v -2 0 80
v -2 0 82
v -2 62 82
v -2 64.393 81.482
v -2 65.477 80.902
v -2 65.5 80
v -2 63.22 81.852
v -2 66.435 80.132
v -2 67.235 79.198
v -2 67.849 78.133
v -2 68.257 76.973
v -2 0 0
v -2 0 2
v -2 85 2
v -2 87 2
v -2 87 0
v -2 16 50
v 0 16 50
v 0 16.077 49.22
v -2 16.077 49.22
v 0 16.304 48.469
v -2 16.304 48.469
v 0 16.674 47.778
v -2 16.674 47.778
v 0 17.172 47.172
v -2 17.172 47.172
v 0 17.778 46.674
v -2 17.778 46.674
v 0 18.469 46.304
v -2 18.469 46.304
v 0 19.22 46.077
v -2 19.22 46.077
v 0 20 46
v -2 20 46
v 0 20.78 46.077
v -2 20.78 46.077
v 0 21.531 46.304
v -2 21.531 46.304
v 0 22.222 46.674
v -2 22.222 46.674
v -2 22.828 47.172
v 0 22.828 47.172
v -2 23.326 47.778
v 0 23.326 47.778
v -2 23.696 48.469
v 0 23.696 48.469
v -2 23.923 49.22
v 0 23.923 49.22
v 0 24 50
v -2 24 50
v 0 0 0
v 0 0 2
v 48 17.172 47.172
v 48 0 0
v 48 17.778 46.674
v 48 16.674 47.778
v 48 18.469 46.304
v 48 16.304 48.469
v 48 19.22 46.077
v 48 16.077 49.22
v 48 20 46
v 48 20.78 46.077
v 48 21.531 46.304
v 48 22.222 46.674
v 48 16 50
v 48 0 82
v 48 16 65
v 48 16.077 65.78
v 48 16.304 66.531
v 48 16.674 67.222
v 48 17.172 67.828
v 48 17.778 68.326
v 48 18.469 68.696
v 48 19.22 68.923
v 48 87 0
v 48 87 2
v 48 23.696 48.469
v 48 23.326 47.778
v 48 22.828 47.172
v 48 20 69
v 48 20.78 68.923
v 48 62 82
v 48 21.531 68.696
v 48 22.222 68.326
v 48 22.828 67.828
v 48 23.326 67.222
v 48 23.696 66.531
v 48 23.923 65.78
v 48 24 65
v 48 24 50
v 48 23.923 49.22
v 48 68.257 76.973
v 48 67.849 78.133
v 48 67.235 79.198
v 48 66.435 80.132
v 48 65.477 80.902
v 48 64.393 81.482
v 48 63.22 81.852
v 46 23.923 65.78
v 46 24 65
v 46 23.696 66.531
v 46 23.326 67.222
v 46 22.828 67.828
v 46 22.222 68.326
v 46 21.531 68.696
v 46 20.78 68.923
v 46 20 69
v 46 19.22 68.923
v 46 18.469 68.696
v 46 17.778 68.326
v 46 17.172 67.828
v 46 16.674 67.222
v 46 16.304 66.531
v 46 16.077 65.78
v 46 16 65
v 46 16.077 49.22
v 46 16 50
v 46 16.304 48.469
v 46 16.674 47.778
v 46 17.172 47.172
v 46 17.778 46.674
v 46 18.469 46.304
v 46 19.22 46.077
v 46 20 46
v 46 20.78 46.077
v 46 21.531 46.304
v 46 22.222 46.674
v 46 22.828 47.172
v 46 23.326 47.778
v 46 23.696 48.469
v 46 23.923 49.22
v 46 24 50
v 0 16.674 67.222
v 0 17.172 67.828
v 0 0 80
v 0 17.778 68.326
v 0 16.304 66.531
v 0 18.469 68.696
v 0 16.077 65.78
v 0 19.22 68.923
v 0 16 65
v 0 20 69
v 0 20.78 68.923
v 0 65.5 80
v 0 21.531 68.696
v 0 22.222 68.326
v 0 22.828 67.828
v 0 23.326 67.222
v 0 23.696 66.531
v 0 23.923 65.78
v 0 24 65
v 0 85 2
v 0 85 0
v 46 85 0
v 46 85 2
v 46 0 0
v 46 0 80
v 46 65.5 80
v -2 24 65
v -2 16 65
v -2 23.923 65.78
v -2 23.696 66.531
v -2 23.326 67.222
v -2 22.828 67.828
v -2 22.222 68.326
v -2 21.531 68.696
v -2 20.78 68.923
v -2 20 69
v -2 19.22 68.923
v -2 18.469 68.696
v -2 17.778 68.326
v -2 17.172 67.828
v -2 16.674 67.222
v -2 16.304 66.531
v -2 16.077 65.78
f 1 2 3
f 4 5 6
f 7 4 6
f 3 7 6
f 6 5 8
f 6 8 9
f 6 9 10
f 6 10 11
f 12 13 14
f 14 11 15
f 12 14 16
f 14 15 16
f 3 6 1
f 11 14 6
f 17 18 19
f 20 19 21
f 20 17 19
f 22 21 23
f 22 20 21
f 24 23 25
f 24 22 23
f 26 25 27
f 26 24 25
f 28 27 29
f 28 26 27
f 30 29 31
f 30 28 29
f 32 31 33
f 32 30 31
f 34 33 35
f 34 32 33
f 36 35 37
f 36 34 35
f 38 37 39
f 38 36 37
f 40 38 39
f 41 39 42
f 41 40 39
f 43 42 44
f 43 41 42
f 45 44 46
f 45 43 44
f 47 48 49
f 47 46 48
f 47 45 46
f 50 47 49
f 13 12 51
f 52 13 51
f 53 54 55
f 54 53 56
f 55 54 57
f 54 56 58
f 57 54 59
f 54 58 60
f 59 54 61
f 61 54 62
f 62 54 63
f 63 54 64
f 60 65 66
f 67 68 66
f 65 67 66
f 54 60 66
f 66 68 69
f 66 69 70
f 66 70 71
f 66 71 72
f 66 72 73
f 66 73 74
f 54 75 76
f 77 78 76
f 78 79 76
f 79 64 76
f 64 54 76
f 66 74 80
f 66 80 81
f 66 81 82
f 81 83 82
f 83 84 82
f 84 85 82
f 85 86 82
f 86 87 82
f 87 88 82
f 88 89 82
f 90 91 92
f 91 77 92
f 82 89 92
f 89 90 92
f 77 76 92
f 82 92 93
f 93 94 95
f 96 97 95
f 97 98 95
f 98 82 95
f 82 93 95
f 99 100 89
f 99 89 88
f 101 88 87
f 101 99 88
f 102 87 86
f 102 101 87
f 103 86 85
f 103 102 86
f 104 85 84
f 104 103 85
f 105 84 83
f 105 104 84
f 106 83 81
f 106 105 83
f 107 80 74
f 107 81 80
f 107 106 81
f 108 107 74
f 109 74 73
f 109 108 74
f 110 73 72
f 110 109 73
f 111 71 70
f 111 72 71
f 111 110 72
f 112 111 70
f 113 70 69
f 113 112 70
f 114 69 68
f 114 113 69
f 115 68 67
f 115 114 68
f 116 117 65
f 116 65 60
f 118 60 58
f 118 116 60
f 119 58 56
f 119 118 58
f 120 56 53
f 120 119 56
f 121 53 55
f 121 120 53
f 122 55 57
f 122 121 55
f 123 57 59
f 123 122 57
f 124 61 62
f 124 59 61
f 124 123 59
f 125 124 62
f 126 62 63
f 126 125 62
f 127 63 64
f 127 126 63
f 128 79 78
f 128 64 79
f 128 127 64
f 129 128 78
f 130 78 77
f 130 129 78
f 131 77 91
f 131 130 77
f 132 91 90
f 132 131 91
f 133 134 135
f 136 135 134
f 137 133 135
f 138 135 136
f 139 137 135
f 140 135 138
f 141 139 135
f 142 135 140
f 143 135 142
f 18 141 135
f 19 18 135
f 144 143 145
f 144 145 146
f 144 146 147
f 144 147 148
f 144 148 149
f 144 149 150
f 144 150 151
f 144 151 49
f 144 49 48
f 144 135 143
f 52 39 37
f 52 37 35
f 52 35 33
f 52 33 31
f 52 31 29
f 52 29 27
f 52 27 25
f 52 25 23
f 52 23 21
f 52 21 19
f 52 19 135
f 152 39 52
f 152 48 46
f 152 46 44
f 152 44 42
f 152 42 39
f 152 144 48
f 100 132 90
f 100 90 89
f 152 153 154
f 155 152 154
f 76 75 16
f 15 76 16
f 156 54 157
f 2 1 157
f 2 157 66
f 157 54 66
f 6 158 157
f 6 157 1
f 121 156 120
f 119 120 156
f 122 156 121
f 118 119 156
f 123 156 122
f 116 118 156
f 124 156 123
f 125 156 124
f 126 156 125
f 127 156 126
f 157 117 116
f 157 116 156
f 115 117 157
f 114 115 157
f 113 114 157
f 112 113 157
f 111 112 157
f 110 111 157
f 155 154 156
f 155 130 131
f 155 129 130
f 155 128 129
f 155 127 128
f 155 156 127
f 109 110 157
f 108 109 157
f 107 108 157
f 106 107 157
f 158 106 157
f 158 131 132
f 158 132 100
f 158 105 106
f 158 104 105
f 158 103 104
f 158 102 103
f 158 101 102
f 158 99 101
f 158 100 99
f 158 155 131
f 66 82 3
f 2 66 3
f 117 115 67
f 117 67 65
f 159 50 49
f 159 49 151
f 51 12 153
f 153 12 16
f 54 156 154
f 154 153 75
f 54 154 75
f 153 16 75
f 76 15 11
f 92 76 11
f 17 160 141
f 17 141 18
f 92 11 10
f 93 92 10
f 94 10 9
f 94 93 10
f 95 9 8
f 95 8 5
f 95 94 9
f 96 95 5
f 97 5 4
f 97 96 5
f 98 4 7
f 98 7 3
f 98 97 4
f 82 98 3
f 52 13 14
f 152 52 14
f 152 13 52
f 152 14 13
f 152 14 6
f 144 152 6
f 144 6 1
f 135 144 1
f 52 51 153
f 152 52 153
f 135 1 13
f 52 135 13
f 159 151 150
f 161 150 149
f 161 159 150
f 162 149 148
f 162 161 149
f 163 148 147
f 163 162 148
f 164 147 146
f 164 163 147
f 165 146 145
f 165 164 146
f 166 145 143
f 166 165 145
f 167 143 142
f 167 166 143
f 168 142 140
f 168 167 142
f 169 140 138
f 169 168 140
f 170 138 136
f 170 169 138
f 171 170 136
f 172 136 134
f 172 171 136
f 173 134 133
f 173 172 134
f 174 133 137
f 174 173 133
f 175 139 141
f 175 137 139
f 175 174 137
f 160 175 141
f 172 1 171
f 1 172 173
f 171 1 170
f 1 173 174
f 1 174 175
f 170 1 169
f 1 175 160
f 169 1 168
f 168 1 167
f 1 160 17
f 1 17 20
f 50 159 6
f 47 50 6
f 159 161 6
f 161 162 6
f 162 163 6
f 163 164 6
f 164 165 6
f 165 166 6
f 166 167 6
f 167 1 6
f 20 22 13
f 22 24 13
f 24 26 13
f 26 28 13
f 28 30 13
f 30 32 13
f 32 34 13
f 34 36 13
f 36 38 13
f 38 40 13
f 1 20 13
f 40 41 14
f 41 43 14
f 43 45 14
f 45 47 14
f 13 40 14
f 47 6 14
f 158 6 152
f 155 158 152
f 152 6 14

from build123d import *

# Parameters (mm, degrees)
EXTRUDE_1_DEPTH     = 2
EXTRUDE_2_DEPTH     = 2
EXTRUDE_6_DEPTH     = 50
EXTRUDE_7_DEPTH     = 2
EXTRUDE_8_DEPTH     = 2
CUT_EXTRUDE_1_DEPTH = 130.587808069
CUT_EXTRUDE_2_DEPTH = 130.587808069


with BuildPart() as part:
    # 草图3 → 凸台-拉伸1 (new body)
    with BuildSketch(Plane.XY.offset(80)):
        Polygon((-2, 0), (-2, 65), (-2, 67), (48, 67), (48, 0), align=None)
    extrude(amount=EXTRUDE_1_DEPTH)



with BuildPart() as body_2:
    # 草图2 → 凸台-拉伸2 (new body)
    with BuildSketch(Plane.XY):
        Polygon((0, 0), (0, 85), (46, 85), (46, 0), (48, 0), (48, 87), (-2, 87), (-2, 0), align=None)
    extrude(amount=EXTRUDE_2_DEPTH)


with BuildPart() as part_1:
    add(part.part)

    add(body_2.part)  # 凸台-拉伸6 merges body 2
    # 草图7 → 凸台-拉伸6 (add)
    with BuildSketch(Plane.ZY.offset(2)):
        Polygon((2, 87), (82, 67), (82, 65), (2, 85), align=None)
    extrude(amount=-EXTRUDE_6_DEPTH)

    # 草图9 → 凸台-拉伸8 (add)
    with BuildSketch(Plane(origin=(48, 0, 0), x_dir=(0, 0, -1), z_dir=(1, 0, 0))):
        Polygon((-80, 65.5), (-2, 85), (-2, 0), (-80, 0), align=None)
    extrude(amount=-EXTRUDE_8_DEPTH)

    # 草图10 → 切除-拉伸1 (cut, through all)
    with BuildSketch(Plane(origin=(48, 0, 0), x_dir=(0, 0, -1), z_dir=(1, 0, 0))):
        with BuildLine():
            Line((-82, 67), (-76.973478931, 68.256630267))
            ThreePointArc((-76.973478931, 68.256630267), (-80.539098364, 65.973770906), (-82, 62))
            Line((-82, 62), (-82, 67))
        make_face()
    extrude(amount=-CUT_EXTRUDE_1_DEPTH, mode=Mode.SUBTRACT)


with BuildPart() as body_2_2:
    # 草图8 → 凸台-拉伸7 (new body)
    with BuildSketch(Plane.ZY.offset(2)):
        Polygon((2, 85), (80, 65.5), (80, 0), (2, 0), align=None)
    extrude(amount=-EXTRUDE_7_DEPTH)


with BuildPart() as cut_extrude_2_tool:
    # 草图11 → 切除-拉伸2 (new, through all)
    with BuildSketch(Plane.ZY.offset(2)):
        with BuildLine():
            Line((50, 24), (65, 24))
            ThreePointArc((65, 24), (69, 20), (65, 16))
            Line((65, 16), (50, 16))
            ThreePointArc((50, 16), (46, 20), (50, 24))
        make_face()
    extrude(amount=-CUT_EXTRUDE_2_DEPTH)


with BuildPart() as part_2:
    add(part_1.part)

    # 切除-拉伸2: cut by cut_extrude_2_tool
    add(cut_extrude_2_tool.part, mode=Mode.SUBTRACT)


with BuildPart() as body_2_2_1:
    add(body_2_2.part)

    # 切除-拉伸2: cut by cut_extrude_2_tool
    add(cut_extrude_2_tool.part, mode=Mode.SUBTRACT)


solid = Compound([part_2.part, body_2_2_1.part])
